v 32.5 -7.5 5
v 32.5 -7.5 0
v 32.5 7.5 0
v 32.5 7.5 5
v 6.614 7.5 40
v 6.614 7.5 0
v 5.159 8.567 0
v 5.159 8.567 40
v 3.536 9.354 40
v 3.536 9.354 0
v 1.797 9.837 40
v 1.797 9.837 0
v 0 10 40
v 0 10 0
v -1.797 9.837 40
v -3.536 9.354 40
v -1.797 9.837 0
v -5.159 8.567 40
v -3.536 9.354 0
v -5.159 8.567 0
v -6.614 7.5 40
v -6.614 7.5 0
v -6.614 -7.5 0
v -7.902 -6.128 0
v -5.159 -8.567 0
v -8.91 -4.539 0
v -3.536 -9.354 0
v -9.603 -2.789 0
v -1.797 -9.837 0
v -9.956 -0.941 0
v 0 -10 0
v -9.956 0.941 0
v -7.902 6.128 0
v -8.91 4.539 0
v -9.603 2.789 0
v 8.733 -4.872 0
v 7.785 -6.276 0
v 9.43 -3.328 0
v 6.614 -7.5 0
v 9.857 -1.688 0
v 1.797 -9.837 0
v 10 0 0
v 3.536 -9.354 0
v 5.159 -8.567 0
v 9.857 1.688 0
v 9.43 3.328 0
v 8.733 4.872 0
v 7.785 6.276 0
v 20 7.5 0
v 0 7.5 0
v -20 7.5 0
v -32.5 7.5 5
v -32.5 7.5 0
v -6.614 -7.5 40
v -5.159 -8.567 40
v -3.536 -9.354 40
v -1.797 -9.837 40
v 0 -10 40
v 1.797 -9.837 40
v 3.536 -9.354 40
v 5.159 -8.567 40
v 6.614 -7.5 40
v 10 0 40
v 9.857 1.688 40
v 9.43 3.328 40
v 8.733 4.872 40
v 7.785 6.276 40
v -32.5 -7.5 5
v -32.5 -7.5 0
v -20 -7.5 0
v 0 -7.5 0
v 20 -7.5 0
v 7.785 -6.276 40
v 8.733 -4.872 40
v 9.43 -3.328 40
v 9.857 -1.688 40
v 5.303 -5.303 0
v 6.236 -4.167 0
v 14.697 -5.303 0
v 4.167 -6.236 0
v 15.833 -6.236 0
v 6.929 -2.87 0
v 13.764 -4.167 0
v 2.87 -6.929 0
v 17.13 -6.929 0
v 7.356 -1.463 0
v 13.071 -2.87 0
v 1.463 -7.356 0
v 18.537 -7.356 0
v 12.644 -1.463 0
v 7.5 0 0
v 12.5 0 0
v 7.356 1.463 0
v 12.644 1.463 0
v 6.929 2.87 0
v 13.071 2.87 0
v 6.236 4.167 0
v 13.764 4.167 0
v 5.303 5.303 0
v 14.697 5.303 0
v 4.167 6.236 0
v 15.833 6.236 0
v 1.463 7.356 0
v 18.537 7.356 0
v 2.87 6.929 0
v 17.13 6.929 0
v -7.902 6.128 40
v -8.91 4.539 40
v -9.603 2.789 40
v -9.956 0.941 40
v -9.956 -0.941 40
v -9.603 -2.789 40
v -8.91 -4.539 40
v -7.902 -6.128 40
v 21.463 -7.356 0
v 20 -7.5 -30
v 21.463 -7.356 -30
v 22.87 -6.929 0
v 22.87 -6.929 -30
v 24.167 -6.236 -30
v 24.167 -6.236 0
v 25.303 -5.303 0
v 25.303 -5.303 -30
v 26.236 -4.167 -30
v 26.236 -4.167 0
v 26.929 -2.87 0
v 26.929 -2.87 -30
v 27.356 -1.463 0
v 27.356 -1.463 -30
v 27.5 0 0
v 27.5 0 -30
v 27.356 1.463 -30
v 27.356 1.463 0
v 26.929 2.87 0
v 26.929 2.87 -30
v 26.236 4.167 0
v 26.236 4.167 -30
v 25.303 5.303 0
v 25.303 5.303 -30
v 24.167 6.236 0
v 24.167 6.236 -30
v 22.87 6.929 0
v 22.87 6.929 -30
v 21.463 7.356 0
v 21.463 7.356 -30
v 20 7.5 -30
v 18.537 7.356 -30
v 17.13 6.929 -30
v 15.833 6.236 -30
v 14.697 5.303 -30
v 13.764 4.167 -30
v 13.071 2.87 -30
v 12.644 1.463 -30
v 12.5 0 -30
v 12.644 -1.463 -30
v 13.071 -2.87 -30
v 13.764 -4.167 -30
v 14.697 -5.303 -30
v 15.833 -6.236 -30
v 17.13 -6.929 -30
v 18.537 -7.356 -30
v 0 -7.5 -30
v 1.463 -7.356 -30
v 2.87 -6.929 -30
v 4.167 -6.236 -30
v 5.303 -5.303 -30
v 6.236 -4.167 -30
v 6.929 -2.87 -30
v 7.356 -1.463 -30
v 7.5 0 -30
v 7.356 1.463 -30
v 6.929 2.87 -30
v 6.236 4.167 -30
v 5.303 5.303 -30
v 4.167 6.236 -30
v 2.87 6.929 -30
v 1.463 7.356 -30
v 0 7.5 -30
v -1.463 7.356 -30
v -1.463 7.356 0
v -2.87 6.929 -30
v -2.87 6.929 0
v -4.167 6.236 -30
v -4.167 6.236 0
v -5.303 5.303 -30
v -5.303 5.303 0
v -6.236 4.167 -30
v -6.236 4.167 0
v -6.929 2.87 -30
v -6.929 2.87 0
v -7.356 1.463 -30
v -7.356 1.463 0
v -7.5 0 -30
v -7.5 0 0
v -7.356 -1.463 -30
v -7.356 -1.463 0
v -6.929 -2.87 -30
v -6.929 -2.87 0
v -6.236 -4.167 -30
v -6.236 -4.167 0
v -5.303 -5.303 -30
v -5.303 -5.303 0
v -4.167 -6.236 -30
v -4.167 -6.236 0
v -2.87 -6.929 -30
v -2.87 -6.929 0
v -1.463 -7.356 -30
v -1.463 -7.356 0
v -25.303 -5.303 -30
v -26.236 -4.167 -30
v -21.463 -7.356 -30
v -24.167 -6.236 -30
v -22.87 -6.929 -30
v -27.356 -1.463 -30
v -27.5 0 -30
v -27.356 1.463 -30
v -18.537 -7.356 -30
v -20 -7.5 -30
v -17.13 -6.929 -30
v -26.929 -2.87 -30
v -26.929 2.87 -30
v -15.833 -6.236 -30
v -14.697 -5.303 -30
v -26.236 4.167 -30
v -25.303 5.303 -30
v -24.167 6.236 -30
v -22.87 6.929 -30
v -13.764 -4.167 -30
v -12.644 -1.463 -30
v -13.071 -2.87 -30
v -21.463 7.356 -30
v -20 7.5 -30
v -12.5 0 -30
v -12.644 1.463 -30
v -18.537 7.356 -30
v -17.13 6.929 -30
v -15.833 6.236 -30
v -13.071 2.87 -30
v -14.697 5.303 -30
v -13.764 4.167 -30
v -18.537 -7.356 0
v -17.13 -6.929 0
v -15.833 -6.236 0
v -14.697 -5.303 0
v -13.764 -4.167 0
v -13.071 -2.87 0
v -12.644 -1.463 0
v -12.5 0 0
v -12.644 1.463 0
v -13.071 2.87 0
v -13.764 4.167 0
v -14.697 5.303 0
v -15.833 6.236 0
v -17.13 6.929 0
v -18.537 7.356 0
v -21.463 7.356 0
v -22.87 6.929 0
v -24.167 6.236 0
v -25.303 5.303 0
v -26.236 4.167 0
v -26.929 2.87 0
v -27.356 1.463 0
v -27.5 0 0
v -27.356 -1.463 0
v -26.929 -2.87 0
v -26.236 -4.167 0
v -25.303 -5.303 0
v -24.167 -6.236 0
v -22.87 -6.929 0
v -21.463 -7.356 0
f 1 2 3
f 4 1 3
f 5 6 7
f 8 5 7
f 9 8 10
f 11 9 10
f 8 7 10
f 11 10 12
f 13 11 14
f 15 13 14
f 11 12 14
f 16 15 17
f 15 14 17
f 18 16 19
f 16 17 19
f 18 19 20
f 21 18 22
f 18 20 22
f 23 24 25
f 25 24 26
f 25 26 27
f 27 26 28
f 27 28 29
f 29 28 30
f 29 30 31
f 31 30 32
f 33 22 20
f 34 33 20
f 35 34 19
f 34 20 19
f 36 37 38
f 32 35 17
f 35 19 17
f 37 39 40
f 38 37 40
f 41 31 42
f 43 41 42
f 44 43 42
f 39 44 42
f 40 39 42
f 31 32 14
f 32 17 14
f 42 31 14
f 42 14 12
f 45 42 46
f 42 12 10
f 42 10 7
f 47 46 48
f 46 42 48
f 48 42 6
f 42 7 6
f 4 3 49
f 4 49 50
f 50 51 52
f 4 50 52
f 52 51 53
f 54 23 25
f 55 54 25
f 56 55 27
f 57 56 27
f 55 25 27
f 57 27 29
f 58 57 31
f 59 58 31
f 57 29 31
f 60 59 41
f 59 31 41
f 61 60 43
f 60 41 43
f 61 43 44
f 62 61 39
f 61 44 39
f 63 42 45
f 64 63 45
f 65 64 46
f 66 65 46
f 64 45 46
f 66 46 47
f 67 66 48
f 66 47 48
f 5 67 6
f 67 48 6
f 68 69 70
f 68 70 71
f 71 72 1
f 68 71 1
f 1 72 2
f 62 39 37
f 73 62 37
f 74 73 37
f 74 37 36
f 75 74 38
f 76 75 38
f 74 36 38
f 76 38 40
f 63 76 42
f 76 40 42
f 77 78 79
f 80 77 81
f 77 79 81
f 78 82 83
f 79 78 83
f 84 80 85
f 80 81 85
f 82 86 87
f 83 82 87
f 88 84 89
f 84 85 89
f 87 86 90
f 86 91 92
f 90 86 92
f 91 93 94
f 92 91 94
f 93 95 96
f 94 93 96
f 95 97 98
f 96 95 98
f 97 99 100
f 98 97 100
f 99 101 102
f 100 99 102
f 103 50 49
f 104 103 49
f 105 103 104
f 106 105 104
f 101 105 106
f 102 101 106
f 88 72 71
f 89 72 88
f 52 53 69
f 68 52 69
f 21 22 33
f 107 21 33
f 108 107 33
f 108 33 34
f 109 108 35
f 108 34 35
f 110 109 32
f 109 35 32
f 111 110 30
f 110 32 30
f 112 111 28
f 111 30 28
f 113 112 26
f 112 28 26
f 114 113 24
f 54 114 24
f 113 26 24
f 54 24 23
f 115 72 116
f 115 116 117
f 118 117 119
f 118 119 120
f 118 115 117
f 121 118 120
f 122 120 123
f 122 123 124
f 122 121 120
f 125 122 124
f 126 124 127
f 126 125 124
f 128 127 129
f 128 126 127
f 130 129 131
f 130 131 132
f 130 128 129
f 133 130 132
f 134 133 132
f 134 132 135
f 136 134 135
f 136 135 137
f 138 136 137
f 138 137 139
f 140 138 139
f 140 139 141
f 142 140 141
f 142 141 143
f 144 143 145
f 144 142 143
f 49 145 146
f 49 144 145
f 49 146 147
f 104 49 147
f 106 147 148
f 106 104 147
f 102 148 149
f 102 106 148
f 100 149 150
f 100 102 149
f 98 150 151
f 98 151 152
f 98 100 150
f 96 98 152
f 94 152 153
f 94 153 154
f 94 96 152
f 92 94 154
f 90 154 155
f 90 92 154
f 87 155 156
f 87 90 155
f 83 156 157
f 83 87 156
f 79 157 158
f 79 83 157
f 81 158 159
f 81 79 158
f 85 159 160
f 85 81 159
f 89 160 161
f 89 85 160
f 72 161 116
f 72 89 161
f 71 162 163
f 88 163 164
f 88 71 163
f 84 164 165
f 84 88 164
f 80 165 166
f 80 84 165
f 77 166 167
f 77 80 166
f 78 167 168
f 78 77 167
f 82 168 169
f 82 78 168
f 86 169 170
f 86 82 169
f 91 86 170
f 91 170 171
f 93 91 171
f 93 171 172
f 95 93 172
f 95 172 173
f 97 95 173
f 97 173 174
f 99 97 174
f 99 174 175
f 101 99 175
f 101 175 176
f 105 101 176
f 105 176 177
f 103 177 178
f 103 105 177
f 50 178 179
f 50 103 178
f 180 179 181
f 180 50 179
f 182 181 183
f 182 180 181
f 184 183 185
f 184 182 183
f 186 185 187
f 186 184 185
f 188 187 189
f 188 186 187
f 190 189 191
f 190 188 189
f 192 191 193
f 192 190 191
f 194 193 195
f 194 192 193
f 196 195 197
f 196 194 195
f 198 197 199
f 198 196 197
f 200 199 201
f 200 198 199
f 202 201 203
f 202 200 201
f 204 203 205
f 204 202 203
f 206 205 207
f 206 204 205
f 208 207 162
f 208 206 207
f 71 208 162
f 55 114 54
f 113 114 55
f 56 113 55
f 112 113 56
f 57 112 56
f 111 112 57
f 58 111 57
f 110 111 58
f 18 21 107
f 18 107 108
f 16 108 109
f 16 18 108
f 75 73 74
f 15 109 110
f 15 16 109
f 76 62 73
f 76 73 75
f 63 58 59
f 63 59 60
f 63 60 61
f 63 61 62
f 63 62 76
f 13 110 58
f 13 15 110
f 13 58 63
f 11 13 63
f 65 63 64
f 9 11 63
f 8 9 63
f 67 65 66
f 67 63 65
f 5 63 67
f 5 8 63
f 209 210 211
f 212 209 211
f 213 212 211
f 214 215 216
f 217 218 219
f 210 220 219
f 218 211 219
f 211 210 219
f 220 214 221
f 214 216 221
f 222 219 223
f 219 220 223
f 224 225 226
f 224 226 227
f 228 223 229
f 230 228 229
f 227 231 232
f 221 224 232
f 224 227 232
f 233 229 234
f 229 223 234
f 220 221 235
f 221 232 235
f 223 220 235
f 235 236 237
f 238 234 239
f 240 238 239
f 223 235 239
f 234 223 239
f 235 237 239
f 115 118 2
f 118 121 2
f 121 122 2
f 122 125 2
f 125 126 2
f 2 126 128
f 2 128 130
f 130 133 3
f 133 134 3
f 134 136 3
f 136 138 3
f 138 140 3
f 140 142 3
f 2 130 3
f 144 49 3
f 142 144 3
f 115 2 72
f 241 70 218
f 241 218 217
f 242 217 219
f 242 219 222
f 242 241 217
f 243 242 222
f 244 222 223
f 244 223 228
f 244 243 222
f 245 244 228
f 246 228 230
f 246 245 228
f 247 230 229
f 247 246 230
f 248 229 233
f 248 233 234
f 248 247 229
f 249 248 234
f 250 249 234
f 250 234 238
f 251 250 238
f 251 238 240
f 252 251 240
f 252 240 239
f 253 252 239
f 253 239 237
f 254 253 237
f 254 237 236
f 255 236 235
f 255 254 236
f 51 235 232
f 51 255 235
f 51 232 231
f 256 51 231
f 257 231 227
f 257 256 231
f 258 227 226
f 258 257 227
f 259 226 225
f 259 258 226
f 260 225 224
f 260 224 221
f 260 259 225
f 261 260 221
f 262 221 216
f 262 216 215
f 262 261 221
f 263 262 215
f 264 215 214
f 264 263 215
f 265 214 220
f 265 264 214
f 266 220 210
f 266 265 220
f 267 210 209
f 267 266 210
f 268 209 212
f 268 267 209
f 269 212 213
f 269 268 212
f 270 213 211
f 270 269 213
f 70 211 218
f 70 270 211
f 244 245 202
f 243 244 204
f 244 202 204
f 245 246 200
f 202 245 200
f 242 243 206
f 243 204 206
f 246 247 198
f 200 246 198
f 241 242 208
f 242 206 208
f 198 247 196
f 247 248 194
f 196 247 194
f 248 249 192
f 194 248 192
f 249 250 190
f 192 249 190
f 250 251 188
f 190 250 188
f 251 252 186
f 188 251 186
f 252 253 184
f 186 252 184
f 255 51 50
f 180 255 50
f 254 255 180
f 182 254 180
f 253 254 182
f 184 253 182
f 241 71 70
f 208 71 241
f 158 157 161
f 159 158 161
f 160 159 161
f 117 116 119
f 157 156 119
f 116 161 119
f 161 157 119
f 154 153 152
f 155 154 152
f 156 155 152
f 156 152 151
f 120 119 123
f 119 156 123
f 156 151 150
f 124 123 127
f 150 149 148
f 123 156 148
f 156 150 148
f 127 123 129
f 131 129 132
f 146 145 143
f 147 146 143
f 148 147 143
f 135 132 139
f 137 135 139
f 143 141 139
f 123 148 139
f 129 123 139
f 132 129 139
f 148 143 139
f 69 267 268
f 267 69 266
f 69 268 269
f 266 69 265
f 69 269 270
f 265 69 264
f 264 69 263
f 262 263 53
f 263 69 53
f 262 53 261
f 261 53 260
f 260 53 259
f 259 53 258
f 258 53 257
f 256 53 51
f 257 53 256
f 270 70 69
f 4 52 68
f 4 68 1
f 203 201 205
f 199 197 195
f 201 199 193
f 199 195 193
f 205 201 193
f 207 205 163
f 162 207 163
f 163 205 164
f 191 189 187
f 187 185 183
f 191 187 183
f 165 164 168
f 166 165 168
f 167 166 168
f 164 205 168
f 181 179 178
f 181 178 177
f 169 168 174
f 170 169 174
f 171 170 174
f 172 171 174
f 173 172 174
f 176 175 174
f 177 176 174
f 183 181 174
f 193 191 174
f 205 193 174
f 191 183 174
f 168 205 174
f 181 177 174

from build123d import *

# Parameters (mm, degrees)
F1_DEPTH = 5
F2_DEPTH = 30
F3_DEPTH = 40


with BuildPart() as f1:
    # F0 (on Top) → F1 (new body)
    with BuildSketch(Plane.XY):
        with BuildLine():
            ThreePointArc((-20, -7.5), (-27.5, 0), (-20, 7.5))
            Line((-20, 7.5), (-32.5, 7.5))
            Line((-32.5, 7.5), (-32.5, -7.5))
            Line((-32.5, -7.5), (-20, -7.5))
        make_face()
        with BuildLine():
            Line((32.5, -7.5), (32.5, 7.5))
            Line((32.5, 7.5), (20, 7.5))
            ThreePointArc((20, 7.5), (25.3033008589, 5.3033008589), (27.5, 0))
            ThreePointArc((27.5, 0), (25.3033008589, -5.3033008589), (20, -7.5))
            Line((20, -7.5), (32.5, -7.5))
        make_face()
        with BuildLine():
            ThreePointArc((27.5, 0), (25.3033008589, 5.3033008589), (20, 7.5))
            ThreePointArc((20, 7.5), (12.5, 0), (20, -7.5))
            ThreePointArc((20, -7.5), (25.3033008589, -5.3033008589), (27.5, 0))
        make_face()
        with BuildLine():
            ThreePointArc((10, 0), (9.1143782777, 4.1143782777), (6.6143782777, 7.5))
            Line((6.6143782777, 7.5), (0, 7.5))
            ThreePointArc((0, 7.5), (5.3033008589, 5.3033008589), (7.5, 0))
            ThreePointArc((7.5, 0), (5.3033008488, -5.303300869), (-2.86e-08, -7.5))
            Line((-2.86e-08, -7.5), (6.6143782777, -7.5))
            ThreePointArc((6.6143782777, -7.5), (9.1143782777, -4.1143782777), (10, 0))
        make_face()
        with BuildLine():
            ThreePointArc((20, -7.5), (12.5, 0), (20, 7.5))
            Line((20, 7.5), (6.6143782777, 7.5))
            ThreePointArc((6.6143782777, 7.5), (9.1143782777, 4.1143782777), (10, 0))
            ThreePointArc((10, 0), (9.1143782777, -4.1143782777), (6.6143782777, -7.5))
            Line((6.6143782777, -7.5), (20, -7.5))
        make_face()
        with BuildLine():
            ThreePointArc((7.5, 0), (5.3033008589, 5.3033008589), (0, 7.5))
            ThreePointArc((0, 7.5), (-7.5, 1.43e-08), (-2.86e-08, -7.5))
            ThreePointArc((-2.86e-08, -7.5), (5.3033008488, -5.303300869), (7.5, 0))
        make_face()
        with BuildLine():
            ThreePointArc((-2.86e-08, -7.5), (-7.5, 1.43e-08), (0, 7.5))
            Line((0, 7.5), (-6.6143782777, 7.5))
            ThreePointArc((-6.6143782777, 7.5), (-10, 0), (-6.6143782777, -7.5))
            Line((-6.6143782777, -7.5), (-2.86e-08, -7.5))
        make_face()
        with BuildLine():
            ThreePointArc((-6.6143782777, -7.5), (-10, 0), (-6.6143782777, 7.5))
            Line((-6.6143782777, 7.5), (-20, 7.5))
            ThreePointArc((-20, 7.5), (-14.6966991411, 5.3033008589), (-12.5, 0))
            ThreePointArc((-12.5, 0), (-14.6966991411, -5.3033008589), (-20, -7.5))
            Line((-20, -7.5), (-6.6143782777, -7.5))
        make_face()
        with BuildLine():
            ThreePointArc((-12.5, 0), (-14.6966991411, 5.3033008589), (-20, 7.5))
            ThreePointArc((-20, 7.5), (-27.5, 0), (-20, -7.5))
            ThreePointArc((-20, -7.5), (-14.6966991411, -5.3033008589), (-12.5, 0))
        make_face()
    extrude(amount=F1_DEPTH)

    # F0 (on Top) → F2 (join)
    with BuildSketch(Plane.XY):
        with BuildLine():
            ThreePointArc((-12.5, 0), (-14.6966991411, 5.3033008589), (-20, 7.5))
            ThreePointArc((-20, 7.5), (-27.5, 0), (-20, -7.5))
            ThreePointArc((-20, -7.5), (-14.6966991411, -5.3033008589), (-12.5, 0))
        make_face()
        with BuildLine():
            ThreePointArc((7.5, 0), (5.3033008589, 5.3033008589), (0, 7.5))
            ThreePointArc((0, 7.5), (-7.5, 1.43e-08), (-2.86e-08, -7.5))
            ThreePointArc((-2.86e-08, -7.5), (5.3033008488, -5.303300869), (7.5, 0))
        make_face()
        with BuildLine():
            ThreePointArc((27.5, 0), (25.3033008589, 5.3033008589), (20, 7.5))
            ThreePointArc((20, 7.5), (12.5, 0), (20, -7.5))
            ThreePointArc((20, -7.5), (25.3033008589, -5.3033008589), (27.5, 0))
        make_face()
    extrude(amount=-F2_DEPTH)


with BuildPart() as f3:
    # F0 (on Top) → F3 (new body)
    with BuildSketch(Plane.XY):
        with BuildLine():
            ThreePointArc((7.5, 0), (5.3033008589, 5.3033008589), (0, 7.5))
            ThreePointArc((0, 7.5), (-7.5, 1.43e-08), (-2.86e-08, -7.5))
            ThreePointArc((-2.86e-08, -7.5), (5.3033008488, -5.303300869), (7.5, 0))
        make_face()
        with BuildLine():
            ThreePointArc((10, 0), (9.1143782777, 4.1143782777), (6.6143782777, 7.5))
            Line((6.6143782777, 7.5), (0, 7.5))
            ThreePointArc((0, 7.5), (5.3033008589, 5.3033008589), (7.5, 0))
            ThreePointArc((7.5, 0), (5.3033008488, -5.303300869), (-2.86e-08, -7.5))
            Line((-2.86e-08, -7.5), (6.6143782777, -7.5))
            ThreePointArc((6.6143782777, -7.5), (9.1143782777, -4.1143782777), (10, 0))
        make_face()
        with BuildLine():
            ThreePointArc((-2.86e-08, -7.5), (-7.5, 1.43e-08), (0, 7.5))
            Line((0, 7.5), (-6.6143782777, 7.5))
            ThreePointArc((-6.6143782777, 7.5), (-10, 0), (-6.6143782777, -7.5))
            Line((-6.6143782777, -7.5), (-2.86e-08, -7.5))
        make_face()
        with BuildLine():
            Line((0, 7.5), (6.6143782777, 7.5))
            ThreePointArc((6.6143782777, 7.5), (0, 10), (-6.6143782777, 7.5))
            Line((-6.6143782777, 7.5), (0, 7.5))
        make_face()
        with BuildLine():
            ThreePointArc((-6.6143782777, -7.5), (0, -10), (6.6143782777, -7.5))
            Line((6.6143782777, -7.5), (-2.86e-08, -7.5))
            Line((-2.86e-08, -7.5), (-6.6143782777, -7.5))
        make_face()
    extrude(amount=F3_DEPTH)


solid = Compound([f1.part, f3.part])
